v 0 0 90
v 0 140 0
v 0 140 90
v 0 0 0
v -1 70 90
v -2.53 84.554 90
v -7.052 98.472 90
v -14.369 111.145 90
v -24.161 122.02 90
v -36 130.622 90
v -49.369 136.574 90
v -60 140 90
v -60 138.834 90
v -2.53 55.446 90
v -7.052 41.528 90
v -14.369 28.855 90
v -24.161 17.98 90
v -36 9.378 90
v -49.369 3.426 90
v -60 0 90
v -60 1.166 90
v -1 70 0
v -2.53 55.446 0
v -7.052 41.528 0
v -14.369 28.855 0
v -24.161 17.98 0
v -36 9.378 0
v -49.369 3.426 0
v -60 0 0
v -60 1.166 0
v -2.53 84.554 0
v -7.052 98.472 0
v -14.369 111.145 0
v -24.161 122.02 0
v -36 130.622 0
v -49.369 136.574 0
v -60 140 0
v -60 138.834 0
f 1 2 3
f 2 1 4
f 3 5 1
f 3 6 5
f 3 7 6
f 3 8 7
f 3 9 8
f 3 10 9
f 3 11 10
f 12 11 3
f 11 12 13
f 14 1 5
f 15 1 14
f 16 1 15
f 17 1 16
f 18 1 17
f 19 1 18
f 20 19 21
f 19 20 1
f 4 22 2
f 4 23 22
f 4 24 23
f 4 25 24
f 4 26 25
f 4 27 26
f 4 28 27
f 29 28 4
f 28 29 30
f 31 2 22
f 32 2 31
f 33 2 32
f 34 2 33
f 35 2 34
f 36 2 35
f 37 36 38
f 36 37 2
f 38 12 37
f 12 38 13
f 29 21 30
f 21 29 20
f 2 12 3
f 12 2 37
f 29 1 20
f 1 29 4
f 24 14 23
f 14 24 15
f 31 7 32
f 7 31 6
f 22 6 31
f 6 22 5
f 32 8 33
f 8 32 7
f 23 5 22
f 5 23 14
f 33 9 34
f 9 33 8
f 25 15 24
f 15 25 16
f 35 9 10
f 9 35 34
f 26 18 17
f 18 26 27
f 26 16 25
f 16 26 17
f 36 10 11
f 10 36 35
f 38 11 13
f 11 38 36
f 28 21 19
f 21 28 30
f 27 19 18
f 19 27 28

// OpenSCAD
module prism(l, w, h){
       polyhedron(
               //         0        1        2        3        4        5
               points=[[0,0,0], [0,w,0], [0,0,h], [0,w,h], [l,0,h], [l,w,h]],
               faces=[[0,1,3,2],[2,3,5,4],[0,1,5,4],[0,2,4],[5,3,1]]
               );
       
}  

module FootPlate(l, w, h){
   prism(l,w,h);
}
 


module BodySupport(l, w, h) {
    // The bulk
    translate([-l, 0, 0])
        cube([l, w, h]);

}
 
// Hugo's Foot width (with shoe) 60 ~ 75

module stirrup(length, depth, width, shoewidth, height)
{
    FootPlate(shoewidth, depth, height);
    BodySupport(length, depth, height);
}


// width : Width into the body.
// Shoewidth = Expected width to support the shoe
// height overall z axis - vertical rise

module complete(length = 60, depth = 140, width=60, shoewidth=60, height=90) {
    difference() {
        stirrup(length, depth, width, shoewidth, height);

        // A body cutout    
        translate([-depth/2-1, depth/2, 0])
           cylinder(height, d=depth);
    }
}

complete();
